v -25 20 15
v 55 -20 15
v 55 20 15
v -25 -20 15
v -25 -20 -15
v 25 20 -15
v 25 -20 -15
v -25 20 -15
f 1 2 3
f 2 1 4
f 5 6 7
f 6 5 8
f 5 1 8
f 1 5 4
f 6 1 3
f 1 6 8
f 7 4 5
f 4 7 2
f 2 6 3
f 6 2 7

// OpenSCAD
length = 40;
width = 50;
height = 30;


union() {
    cube([width, length, height], center=true);
    translate([width/2, length/2, -height/2]) {
        rotate([90, 0, 0]) {
            linear_extrude(height=length) {
                polygon([[0, 0],[0, height],[30, height]]);
            }
        }
    }
}
